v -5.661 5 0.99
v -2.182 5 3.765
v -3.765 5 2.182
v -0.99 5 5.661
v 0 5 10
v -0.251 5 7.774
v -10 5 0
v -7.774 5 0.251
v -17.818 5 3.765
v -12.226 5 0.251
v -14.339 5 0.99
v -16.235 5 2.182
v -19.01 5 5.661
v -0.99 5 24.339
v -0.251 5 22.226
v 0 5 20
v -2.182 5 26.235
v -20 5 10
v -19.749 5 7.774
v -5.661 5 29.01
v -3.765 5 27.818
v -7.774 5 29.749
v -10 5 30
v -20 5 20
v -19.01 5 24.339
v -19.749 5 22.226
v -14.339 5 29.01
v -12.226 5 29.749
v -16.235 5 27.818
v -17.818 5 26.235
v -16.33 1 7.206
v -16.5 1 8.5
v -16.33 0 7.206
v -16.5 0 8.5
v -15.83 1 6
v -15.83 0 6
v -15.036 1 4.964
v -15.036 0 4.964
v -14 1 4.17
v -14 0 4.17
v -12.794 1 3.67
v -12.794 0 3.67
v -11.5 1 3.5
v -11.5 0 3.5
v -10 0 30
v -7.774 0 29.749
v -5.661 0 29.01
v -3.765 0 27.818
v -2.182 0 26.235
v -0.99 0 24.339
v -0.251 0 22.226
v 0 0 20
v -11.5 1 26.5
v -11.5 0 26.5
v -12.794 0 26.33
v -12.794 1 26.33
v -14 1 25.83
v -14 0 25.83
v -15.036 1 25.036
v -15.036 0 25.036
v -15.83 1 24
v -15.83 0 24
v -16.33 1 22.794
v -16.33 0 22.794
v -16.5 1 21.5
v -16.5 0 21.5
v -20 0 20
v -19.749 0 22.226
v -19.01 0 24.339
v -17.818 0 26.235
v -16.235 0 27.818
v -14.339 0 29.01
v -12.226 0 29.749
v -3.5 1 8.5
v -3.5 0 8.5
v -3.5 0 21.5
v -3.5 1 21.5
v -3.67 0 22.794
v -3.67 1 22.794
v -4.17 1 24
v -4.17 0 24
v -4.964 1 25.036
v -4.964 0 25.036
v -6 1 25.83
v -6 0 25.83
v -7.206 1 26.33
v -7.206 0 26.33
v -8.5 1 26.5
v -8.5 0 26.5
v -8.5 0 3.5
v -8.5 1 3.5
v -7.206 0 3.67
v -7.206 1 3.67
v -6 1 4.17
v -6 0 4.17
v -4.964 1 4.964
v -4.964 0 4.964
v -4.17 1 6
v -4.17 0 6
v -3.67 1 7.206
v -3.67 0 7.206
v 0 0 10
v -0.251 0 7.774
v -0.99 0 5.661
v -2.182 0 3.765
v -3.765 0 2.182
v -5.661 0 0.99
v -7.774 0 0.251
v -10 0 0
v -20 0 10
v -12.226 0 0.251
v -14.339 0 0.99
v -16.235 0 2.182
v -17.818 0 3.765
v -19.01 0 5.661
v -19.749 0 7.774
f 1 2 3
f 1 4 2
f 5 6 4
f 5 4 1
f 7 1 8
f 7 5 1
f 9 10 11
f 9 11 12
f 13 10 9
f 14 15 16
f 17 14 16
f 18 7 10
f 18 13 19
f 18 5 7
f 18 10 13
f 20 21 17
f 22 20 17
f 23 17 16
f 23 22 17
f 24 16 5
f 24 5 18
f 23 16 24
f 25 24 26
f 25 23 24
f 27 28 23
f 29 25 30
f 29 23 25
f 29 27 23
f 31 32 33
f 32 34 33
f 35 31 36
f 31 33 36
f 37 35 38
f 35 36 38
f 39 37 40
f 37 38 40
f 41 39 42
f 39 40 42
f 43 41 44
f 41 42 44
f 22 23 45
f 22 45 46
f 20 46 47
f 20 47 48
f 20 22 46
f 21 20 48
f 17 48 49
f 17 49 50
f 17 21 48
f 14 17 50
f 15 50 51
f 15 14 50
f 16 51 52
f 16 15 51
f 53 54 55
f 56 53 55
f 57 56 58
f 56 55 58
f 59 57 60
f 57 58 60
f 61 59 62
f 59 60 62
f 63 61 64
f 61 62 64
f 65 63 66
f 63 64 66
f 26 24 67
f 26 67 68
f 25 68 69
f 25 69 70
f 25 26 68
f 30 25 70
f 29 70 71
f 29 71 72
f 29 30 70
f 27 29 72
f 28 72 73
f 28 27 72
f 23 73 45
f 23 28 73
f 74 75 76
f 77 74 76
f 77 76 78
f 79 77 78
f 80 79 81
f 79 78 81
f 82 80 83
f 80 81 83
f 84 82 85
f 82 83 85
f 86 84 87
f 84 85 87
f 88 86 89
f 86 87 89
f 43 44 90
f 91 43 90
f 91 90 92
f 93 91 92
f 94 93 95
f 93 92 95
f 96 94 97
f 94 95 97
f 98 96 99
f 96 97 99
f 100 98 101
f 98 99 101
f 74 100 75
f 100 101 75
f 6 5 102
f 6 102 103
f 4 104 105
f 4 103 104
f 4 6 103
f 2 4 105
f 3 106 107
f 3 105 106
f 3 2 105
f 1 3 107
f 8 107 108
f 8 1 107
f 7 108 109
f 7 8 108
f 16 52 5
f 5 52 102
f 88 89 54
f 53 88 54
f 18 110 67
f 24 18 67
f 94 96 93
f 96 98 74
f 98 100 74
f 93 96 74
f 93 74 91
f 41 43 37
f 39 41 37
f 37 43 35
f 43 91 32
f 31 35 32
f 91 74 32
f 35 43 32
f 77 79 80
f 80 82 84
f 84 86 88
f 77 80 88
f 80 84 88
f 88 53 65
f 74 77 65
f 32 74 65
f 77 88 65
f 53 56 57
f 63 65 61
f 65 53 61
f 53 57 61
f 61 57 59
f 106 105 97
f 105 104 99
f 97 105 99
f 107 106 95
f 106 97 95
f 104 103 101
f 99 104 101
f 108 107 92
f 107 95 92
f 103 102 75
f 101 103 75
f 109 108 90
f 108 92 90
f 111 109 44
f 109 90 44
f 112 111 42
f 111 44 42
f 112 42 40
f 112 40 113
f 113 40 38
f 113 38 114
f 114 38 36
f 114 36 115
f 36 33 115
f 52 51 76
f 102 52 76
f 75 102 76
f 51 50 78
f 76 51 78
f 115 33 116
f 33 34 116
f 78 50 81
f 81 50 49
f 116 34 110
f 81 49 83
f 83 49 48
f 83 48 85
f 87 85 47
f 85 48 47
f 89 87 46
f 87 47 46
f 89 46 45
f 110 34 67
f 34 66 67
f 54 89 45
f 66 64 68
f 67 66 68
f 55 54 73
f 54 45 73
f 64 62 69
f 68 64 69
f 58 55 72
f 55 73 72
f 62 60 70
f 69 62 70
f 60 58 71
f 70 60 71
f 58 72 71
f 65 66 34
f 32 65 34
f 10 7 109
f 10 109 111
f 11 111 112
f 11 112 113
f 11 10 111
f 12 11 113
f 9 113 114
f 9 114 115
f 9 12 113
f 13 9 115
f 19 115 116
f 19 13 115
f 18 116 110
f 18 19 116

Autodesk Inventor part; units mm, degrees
ref_plane "YZ Plane" through (0, 0, 0) normal (1, 0, 0) x (0, 1, 0)
ref_plane "XZ Plane" through (0, 0, 0) normal (0, 1, 0) x (-1, 0, 0)
ref_plane "XY Plane" through (0, 0, 0) normal (0, 0, 1) x (1, 0, 0)
sketch "Sketch1" plane through (0, 0, 0) normal (0, 1, 0) x (-1, 0, 0)
  line L0 (0, 0) -> (20, 0)
  line L1 (20, 0) -> (20, 30)
  line L2 (20, 30) -> (0, 30)
  line L3 (0, 30) -> (0, 0)
  line L4 (0, 30) -> (20, 0)
  line L5 (0, 0) -> (20, 30)
  line L6 (11.5, 3.5) -> (8.5, 3.5)
  line L7 (3.5, 8.5) -> (3.5, 21.5)
  line L8 (8.5, 26.5) -> (11.5, 26.5)
  line L9 (16.5, 21.5) -> (16.5, 8.5)
  line L10 (16.5, 3.5) -> (3.5, 26.5) construction
  line L11 (3.5, 3.5) -> (16.5, 26.5) construction
  arc A0 (8.5, 26.5) -> (3.5, 21.5) centre (8.5, 21.5) ccw
  arc A1 (16.5, 21.5) -> (11.5, 26.5) centre (11.5, 21.5) ccw
  arc A2 (11.5, 3.5) -> (16.5, 8.5) centre (11.5, 8.5) ccw
  arc A3 (3.5, 8.5) -> (8.5, 3.5) centre (8.5, 8.5) ccw
  line L12 (12.5954, 0) -> (7.0954, 0)
  line L13 (7.0954, 0) -> (7.0954, 1.5)
  line L14 (7.0954, 1.5) -> (12.5954, 1.5)
  line L15 (12.5954, 1.5) -> (12.5954, 0)
  point P0 (10, 15)
  dimension "d0" = 20
  dimension "d1" = 30
  dimension "d5" = 13
  dimension "d6" = 23
  dimension "d7" = 5
  dimension "d10" = 5.5
  dimension "d11" = 1.5
extrude "Extrusion1" add sketch "Sketch1" along normal blind 5
fillet "Fillet1" radius 10 4 edges at (0, 2.5, 30) (0, 2.5, 0) (-20, 2.5, 0) (-20, 2.5, 30)
extrude "Extrusion2" cut sketch "Sketch1" along normal blind 1 contours A3 L7 A0 L4 L5 | L5 L4 A2 L6 A3 | A0 L8 A1 L5 L4 | L5 A1 L9 A2 L4
properties part number "glosnik"
